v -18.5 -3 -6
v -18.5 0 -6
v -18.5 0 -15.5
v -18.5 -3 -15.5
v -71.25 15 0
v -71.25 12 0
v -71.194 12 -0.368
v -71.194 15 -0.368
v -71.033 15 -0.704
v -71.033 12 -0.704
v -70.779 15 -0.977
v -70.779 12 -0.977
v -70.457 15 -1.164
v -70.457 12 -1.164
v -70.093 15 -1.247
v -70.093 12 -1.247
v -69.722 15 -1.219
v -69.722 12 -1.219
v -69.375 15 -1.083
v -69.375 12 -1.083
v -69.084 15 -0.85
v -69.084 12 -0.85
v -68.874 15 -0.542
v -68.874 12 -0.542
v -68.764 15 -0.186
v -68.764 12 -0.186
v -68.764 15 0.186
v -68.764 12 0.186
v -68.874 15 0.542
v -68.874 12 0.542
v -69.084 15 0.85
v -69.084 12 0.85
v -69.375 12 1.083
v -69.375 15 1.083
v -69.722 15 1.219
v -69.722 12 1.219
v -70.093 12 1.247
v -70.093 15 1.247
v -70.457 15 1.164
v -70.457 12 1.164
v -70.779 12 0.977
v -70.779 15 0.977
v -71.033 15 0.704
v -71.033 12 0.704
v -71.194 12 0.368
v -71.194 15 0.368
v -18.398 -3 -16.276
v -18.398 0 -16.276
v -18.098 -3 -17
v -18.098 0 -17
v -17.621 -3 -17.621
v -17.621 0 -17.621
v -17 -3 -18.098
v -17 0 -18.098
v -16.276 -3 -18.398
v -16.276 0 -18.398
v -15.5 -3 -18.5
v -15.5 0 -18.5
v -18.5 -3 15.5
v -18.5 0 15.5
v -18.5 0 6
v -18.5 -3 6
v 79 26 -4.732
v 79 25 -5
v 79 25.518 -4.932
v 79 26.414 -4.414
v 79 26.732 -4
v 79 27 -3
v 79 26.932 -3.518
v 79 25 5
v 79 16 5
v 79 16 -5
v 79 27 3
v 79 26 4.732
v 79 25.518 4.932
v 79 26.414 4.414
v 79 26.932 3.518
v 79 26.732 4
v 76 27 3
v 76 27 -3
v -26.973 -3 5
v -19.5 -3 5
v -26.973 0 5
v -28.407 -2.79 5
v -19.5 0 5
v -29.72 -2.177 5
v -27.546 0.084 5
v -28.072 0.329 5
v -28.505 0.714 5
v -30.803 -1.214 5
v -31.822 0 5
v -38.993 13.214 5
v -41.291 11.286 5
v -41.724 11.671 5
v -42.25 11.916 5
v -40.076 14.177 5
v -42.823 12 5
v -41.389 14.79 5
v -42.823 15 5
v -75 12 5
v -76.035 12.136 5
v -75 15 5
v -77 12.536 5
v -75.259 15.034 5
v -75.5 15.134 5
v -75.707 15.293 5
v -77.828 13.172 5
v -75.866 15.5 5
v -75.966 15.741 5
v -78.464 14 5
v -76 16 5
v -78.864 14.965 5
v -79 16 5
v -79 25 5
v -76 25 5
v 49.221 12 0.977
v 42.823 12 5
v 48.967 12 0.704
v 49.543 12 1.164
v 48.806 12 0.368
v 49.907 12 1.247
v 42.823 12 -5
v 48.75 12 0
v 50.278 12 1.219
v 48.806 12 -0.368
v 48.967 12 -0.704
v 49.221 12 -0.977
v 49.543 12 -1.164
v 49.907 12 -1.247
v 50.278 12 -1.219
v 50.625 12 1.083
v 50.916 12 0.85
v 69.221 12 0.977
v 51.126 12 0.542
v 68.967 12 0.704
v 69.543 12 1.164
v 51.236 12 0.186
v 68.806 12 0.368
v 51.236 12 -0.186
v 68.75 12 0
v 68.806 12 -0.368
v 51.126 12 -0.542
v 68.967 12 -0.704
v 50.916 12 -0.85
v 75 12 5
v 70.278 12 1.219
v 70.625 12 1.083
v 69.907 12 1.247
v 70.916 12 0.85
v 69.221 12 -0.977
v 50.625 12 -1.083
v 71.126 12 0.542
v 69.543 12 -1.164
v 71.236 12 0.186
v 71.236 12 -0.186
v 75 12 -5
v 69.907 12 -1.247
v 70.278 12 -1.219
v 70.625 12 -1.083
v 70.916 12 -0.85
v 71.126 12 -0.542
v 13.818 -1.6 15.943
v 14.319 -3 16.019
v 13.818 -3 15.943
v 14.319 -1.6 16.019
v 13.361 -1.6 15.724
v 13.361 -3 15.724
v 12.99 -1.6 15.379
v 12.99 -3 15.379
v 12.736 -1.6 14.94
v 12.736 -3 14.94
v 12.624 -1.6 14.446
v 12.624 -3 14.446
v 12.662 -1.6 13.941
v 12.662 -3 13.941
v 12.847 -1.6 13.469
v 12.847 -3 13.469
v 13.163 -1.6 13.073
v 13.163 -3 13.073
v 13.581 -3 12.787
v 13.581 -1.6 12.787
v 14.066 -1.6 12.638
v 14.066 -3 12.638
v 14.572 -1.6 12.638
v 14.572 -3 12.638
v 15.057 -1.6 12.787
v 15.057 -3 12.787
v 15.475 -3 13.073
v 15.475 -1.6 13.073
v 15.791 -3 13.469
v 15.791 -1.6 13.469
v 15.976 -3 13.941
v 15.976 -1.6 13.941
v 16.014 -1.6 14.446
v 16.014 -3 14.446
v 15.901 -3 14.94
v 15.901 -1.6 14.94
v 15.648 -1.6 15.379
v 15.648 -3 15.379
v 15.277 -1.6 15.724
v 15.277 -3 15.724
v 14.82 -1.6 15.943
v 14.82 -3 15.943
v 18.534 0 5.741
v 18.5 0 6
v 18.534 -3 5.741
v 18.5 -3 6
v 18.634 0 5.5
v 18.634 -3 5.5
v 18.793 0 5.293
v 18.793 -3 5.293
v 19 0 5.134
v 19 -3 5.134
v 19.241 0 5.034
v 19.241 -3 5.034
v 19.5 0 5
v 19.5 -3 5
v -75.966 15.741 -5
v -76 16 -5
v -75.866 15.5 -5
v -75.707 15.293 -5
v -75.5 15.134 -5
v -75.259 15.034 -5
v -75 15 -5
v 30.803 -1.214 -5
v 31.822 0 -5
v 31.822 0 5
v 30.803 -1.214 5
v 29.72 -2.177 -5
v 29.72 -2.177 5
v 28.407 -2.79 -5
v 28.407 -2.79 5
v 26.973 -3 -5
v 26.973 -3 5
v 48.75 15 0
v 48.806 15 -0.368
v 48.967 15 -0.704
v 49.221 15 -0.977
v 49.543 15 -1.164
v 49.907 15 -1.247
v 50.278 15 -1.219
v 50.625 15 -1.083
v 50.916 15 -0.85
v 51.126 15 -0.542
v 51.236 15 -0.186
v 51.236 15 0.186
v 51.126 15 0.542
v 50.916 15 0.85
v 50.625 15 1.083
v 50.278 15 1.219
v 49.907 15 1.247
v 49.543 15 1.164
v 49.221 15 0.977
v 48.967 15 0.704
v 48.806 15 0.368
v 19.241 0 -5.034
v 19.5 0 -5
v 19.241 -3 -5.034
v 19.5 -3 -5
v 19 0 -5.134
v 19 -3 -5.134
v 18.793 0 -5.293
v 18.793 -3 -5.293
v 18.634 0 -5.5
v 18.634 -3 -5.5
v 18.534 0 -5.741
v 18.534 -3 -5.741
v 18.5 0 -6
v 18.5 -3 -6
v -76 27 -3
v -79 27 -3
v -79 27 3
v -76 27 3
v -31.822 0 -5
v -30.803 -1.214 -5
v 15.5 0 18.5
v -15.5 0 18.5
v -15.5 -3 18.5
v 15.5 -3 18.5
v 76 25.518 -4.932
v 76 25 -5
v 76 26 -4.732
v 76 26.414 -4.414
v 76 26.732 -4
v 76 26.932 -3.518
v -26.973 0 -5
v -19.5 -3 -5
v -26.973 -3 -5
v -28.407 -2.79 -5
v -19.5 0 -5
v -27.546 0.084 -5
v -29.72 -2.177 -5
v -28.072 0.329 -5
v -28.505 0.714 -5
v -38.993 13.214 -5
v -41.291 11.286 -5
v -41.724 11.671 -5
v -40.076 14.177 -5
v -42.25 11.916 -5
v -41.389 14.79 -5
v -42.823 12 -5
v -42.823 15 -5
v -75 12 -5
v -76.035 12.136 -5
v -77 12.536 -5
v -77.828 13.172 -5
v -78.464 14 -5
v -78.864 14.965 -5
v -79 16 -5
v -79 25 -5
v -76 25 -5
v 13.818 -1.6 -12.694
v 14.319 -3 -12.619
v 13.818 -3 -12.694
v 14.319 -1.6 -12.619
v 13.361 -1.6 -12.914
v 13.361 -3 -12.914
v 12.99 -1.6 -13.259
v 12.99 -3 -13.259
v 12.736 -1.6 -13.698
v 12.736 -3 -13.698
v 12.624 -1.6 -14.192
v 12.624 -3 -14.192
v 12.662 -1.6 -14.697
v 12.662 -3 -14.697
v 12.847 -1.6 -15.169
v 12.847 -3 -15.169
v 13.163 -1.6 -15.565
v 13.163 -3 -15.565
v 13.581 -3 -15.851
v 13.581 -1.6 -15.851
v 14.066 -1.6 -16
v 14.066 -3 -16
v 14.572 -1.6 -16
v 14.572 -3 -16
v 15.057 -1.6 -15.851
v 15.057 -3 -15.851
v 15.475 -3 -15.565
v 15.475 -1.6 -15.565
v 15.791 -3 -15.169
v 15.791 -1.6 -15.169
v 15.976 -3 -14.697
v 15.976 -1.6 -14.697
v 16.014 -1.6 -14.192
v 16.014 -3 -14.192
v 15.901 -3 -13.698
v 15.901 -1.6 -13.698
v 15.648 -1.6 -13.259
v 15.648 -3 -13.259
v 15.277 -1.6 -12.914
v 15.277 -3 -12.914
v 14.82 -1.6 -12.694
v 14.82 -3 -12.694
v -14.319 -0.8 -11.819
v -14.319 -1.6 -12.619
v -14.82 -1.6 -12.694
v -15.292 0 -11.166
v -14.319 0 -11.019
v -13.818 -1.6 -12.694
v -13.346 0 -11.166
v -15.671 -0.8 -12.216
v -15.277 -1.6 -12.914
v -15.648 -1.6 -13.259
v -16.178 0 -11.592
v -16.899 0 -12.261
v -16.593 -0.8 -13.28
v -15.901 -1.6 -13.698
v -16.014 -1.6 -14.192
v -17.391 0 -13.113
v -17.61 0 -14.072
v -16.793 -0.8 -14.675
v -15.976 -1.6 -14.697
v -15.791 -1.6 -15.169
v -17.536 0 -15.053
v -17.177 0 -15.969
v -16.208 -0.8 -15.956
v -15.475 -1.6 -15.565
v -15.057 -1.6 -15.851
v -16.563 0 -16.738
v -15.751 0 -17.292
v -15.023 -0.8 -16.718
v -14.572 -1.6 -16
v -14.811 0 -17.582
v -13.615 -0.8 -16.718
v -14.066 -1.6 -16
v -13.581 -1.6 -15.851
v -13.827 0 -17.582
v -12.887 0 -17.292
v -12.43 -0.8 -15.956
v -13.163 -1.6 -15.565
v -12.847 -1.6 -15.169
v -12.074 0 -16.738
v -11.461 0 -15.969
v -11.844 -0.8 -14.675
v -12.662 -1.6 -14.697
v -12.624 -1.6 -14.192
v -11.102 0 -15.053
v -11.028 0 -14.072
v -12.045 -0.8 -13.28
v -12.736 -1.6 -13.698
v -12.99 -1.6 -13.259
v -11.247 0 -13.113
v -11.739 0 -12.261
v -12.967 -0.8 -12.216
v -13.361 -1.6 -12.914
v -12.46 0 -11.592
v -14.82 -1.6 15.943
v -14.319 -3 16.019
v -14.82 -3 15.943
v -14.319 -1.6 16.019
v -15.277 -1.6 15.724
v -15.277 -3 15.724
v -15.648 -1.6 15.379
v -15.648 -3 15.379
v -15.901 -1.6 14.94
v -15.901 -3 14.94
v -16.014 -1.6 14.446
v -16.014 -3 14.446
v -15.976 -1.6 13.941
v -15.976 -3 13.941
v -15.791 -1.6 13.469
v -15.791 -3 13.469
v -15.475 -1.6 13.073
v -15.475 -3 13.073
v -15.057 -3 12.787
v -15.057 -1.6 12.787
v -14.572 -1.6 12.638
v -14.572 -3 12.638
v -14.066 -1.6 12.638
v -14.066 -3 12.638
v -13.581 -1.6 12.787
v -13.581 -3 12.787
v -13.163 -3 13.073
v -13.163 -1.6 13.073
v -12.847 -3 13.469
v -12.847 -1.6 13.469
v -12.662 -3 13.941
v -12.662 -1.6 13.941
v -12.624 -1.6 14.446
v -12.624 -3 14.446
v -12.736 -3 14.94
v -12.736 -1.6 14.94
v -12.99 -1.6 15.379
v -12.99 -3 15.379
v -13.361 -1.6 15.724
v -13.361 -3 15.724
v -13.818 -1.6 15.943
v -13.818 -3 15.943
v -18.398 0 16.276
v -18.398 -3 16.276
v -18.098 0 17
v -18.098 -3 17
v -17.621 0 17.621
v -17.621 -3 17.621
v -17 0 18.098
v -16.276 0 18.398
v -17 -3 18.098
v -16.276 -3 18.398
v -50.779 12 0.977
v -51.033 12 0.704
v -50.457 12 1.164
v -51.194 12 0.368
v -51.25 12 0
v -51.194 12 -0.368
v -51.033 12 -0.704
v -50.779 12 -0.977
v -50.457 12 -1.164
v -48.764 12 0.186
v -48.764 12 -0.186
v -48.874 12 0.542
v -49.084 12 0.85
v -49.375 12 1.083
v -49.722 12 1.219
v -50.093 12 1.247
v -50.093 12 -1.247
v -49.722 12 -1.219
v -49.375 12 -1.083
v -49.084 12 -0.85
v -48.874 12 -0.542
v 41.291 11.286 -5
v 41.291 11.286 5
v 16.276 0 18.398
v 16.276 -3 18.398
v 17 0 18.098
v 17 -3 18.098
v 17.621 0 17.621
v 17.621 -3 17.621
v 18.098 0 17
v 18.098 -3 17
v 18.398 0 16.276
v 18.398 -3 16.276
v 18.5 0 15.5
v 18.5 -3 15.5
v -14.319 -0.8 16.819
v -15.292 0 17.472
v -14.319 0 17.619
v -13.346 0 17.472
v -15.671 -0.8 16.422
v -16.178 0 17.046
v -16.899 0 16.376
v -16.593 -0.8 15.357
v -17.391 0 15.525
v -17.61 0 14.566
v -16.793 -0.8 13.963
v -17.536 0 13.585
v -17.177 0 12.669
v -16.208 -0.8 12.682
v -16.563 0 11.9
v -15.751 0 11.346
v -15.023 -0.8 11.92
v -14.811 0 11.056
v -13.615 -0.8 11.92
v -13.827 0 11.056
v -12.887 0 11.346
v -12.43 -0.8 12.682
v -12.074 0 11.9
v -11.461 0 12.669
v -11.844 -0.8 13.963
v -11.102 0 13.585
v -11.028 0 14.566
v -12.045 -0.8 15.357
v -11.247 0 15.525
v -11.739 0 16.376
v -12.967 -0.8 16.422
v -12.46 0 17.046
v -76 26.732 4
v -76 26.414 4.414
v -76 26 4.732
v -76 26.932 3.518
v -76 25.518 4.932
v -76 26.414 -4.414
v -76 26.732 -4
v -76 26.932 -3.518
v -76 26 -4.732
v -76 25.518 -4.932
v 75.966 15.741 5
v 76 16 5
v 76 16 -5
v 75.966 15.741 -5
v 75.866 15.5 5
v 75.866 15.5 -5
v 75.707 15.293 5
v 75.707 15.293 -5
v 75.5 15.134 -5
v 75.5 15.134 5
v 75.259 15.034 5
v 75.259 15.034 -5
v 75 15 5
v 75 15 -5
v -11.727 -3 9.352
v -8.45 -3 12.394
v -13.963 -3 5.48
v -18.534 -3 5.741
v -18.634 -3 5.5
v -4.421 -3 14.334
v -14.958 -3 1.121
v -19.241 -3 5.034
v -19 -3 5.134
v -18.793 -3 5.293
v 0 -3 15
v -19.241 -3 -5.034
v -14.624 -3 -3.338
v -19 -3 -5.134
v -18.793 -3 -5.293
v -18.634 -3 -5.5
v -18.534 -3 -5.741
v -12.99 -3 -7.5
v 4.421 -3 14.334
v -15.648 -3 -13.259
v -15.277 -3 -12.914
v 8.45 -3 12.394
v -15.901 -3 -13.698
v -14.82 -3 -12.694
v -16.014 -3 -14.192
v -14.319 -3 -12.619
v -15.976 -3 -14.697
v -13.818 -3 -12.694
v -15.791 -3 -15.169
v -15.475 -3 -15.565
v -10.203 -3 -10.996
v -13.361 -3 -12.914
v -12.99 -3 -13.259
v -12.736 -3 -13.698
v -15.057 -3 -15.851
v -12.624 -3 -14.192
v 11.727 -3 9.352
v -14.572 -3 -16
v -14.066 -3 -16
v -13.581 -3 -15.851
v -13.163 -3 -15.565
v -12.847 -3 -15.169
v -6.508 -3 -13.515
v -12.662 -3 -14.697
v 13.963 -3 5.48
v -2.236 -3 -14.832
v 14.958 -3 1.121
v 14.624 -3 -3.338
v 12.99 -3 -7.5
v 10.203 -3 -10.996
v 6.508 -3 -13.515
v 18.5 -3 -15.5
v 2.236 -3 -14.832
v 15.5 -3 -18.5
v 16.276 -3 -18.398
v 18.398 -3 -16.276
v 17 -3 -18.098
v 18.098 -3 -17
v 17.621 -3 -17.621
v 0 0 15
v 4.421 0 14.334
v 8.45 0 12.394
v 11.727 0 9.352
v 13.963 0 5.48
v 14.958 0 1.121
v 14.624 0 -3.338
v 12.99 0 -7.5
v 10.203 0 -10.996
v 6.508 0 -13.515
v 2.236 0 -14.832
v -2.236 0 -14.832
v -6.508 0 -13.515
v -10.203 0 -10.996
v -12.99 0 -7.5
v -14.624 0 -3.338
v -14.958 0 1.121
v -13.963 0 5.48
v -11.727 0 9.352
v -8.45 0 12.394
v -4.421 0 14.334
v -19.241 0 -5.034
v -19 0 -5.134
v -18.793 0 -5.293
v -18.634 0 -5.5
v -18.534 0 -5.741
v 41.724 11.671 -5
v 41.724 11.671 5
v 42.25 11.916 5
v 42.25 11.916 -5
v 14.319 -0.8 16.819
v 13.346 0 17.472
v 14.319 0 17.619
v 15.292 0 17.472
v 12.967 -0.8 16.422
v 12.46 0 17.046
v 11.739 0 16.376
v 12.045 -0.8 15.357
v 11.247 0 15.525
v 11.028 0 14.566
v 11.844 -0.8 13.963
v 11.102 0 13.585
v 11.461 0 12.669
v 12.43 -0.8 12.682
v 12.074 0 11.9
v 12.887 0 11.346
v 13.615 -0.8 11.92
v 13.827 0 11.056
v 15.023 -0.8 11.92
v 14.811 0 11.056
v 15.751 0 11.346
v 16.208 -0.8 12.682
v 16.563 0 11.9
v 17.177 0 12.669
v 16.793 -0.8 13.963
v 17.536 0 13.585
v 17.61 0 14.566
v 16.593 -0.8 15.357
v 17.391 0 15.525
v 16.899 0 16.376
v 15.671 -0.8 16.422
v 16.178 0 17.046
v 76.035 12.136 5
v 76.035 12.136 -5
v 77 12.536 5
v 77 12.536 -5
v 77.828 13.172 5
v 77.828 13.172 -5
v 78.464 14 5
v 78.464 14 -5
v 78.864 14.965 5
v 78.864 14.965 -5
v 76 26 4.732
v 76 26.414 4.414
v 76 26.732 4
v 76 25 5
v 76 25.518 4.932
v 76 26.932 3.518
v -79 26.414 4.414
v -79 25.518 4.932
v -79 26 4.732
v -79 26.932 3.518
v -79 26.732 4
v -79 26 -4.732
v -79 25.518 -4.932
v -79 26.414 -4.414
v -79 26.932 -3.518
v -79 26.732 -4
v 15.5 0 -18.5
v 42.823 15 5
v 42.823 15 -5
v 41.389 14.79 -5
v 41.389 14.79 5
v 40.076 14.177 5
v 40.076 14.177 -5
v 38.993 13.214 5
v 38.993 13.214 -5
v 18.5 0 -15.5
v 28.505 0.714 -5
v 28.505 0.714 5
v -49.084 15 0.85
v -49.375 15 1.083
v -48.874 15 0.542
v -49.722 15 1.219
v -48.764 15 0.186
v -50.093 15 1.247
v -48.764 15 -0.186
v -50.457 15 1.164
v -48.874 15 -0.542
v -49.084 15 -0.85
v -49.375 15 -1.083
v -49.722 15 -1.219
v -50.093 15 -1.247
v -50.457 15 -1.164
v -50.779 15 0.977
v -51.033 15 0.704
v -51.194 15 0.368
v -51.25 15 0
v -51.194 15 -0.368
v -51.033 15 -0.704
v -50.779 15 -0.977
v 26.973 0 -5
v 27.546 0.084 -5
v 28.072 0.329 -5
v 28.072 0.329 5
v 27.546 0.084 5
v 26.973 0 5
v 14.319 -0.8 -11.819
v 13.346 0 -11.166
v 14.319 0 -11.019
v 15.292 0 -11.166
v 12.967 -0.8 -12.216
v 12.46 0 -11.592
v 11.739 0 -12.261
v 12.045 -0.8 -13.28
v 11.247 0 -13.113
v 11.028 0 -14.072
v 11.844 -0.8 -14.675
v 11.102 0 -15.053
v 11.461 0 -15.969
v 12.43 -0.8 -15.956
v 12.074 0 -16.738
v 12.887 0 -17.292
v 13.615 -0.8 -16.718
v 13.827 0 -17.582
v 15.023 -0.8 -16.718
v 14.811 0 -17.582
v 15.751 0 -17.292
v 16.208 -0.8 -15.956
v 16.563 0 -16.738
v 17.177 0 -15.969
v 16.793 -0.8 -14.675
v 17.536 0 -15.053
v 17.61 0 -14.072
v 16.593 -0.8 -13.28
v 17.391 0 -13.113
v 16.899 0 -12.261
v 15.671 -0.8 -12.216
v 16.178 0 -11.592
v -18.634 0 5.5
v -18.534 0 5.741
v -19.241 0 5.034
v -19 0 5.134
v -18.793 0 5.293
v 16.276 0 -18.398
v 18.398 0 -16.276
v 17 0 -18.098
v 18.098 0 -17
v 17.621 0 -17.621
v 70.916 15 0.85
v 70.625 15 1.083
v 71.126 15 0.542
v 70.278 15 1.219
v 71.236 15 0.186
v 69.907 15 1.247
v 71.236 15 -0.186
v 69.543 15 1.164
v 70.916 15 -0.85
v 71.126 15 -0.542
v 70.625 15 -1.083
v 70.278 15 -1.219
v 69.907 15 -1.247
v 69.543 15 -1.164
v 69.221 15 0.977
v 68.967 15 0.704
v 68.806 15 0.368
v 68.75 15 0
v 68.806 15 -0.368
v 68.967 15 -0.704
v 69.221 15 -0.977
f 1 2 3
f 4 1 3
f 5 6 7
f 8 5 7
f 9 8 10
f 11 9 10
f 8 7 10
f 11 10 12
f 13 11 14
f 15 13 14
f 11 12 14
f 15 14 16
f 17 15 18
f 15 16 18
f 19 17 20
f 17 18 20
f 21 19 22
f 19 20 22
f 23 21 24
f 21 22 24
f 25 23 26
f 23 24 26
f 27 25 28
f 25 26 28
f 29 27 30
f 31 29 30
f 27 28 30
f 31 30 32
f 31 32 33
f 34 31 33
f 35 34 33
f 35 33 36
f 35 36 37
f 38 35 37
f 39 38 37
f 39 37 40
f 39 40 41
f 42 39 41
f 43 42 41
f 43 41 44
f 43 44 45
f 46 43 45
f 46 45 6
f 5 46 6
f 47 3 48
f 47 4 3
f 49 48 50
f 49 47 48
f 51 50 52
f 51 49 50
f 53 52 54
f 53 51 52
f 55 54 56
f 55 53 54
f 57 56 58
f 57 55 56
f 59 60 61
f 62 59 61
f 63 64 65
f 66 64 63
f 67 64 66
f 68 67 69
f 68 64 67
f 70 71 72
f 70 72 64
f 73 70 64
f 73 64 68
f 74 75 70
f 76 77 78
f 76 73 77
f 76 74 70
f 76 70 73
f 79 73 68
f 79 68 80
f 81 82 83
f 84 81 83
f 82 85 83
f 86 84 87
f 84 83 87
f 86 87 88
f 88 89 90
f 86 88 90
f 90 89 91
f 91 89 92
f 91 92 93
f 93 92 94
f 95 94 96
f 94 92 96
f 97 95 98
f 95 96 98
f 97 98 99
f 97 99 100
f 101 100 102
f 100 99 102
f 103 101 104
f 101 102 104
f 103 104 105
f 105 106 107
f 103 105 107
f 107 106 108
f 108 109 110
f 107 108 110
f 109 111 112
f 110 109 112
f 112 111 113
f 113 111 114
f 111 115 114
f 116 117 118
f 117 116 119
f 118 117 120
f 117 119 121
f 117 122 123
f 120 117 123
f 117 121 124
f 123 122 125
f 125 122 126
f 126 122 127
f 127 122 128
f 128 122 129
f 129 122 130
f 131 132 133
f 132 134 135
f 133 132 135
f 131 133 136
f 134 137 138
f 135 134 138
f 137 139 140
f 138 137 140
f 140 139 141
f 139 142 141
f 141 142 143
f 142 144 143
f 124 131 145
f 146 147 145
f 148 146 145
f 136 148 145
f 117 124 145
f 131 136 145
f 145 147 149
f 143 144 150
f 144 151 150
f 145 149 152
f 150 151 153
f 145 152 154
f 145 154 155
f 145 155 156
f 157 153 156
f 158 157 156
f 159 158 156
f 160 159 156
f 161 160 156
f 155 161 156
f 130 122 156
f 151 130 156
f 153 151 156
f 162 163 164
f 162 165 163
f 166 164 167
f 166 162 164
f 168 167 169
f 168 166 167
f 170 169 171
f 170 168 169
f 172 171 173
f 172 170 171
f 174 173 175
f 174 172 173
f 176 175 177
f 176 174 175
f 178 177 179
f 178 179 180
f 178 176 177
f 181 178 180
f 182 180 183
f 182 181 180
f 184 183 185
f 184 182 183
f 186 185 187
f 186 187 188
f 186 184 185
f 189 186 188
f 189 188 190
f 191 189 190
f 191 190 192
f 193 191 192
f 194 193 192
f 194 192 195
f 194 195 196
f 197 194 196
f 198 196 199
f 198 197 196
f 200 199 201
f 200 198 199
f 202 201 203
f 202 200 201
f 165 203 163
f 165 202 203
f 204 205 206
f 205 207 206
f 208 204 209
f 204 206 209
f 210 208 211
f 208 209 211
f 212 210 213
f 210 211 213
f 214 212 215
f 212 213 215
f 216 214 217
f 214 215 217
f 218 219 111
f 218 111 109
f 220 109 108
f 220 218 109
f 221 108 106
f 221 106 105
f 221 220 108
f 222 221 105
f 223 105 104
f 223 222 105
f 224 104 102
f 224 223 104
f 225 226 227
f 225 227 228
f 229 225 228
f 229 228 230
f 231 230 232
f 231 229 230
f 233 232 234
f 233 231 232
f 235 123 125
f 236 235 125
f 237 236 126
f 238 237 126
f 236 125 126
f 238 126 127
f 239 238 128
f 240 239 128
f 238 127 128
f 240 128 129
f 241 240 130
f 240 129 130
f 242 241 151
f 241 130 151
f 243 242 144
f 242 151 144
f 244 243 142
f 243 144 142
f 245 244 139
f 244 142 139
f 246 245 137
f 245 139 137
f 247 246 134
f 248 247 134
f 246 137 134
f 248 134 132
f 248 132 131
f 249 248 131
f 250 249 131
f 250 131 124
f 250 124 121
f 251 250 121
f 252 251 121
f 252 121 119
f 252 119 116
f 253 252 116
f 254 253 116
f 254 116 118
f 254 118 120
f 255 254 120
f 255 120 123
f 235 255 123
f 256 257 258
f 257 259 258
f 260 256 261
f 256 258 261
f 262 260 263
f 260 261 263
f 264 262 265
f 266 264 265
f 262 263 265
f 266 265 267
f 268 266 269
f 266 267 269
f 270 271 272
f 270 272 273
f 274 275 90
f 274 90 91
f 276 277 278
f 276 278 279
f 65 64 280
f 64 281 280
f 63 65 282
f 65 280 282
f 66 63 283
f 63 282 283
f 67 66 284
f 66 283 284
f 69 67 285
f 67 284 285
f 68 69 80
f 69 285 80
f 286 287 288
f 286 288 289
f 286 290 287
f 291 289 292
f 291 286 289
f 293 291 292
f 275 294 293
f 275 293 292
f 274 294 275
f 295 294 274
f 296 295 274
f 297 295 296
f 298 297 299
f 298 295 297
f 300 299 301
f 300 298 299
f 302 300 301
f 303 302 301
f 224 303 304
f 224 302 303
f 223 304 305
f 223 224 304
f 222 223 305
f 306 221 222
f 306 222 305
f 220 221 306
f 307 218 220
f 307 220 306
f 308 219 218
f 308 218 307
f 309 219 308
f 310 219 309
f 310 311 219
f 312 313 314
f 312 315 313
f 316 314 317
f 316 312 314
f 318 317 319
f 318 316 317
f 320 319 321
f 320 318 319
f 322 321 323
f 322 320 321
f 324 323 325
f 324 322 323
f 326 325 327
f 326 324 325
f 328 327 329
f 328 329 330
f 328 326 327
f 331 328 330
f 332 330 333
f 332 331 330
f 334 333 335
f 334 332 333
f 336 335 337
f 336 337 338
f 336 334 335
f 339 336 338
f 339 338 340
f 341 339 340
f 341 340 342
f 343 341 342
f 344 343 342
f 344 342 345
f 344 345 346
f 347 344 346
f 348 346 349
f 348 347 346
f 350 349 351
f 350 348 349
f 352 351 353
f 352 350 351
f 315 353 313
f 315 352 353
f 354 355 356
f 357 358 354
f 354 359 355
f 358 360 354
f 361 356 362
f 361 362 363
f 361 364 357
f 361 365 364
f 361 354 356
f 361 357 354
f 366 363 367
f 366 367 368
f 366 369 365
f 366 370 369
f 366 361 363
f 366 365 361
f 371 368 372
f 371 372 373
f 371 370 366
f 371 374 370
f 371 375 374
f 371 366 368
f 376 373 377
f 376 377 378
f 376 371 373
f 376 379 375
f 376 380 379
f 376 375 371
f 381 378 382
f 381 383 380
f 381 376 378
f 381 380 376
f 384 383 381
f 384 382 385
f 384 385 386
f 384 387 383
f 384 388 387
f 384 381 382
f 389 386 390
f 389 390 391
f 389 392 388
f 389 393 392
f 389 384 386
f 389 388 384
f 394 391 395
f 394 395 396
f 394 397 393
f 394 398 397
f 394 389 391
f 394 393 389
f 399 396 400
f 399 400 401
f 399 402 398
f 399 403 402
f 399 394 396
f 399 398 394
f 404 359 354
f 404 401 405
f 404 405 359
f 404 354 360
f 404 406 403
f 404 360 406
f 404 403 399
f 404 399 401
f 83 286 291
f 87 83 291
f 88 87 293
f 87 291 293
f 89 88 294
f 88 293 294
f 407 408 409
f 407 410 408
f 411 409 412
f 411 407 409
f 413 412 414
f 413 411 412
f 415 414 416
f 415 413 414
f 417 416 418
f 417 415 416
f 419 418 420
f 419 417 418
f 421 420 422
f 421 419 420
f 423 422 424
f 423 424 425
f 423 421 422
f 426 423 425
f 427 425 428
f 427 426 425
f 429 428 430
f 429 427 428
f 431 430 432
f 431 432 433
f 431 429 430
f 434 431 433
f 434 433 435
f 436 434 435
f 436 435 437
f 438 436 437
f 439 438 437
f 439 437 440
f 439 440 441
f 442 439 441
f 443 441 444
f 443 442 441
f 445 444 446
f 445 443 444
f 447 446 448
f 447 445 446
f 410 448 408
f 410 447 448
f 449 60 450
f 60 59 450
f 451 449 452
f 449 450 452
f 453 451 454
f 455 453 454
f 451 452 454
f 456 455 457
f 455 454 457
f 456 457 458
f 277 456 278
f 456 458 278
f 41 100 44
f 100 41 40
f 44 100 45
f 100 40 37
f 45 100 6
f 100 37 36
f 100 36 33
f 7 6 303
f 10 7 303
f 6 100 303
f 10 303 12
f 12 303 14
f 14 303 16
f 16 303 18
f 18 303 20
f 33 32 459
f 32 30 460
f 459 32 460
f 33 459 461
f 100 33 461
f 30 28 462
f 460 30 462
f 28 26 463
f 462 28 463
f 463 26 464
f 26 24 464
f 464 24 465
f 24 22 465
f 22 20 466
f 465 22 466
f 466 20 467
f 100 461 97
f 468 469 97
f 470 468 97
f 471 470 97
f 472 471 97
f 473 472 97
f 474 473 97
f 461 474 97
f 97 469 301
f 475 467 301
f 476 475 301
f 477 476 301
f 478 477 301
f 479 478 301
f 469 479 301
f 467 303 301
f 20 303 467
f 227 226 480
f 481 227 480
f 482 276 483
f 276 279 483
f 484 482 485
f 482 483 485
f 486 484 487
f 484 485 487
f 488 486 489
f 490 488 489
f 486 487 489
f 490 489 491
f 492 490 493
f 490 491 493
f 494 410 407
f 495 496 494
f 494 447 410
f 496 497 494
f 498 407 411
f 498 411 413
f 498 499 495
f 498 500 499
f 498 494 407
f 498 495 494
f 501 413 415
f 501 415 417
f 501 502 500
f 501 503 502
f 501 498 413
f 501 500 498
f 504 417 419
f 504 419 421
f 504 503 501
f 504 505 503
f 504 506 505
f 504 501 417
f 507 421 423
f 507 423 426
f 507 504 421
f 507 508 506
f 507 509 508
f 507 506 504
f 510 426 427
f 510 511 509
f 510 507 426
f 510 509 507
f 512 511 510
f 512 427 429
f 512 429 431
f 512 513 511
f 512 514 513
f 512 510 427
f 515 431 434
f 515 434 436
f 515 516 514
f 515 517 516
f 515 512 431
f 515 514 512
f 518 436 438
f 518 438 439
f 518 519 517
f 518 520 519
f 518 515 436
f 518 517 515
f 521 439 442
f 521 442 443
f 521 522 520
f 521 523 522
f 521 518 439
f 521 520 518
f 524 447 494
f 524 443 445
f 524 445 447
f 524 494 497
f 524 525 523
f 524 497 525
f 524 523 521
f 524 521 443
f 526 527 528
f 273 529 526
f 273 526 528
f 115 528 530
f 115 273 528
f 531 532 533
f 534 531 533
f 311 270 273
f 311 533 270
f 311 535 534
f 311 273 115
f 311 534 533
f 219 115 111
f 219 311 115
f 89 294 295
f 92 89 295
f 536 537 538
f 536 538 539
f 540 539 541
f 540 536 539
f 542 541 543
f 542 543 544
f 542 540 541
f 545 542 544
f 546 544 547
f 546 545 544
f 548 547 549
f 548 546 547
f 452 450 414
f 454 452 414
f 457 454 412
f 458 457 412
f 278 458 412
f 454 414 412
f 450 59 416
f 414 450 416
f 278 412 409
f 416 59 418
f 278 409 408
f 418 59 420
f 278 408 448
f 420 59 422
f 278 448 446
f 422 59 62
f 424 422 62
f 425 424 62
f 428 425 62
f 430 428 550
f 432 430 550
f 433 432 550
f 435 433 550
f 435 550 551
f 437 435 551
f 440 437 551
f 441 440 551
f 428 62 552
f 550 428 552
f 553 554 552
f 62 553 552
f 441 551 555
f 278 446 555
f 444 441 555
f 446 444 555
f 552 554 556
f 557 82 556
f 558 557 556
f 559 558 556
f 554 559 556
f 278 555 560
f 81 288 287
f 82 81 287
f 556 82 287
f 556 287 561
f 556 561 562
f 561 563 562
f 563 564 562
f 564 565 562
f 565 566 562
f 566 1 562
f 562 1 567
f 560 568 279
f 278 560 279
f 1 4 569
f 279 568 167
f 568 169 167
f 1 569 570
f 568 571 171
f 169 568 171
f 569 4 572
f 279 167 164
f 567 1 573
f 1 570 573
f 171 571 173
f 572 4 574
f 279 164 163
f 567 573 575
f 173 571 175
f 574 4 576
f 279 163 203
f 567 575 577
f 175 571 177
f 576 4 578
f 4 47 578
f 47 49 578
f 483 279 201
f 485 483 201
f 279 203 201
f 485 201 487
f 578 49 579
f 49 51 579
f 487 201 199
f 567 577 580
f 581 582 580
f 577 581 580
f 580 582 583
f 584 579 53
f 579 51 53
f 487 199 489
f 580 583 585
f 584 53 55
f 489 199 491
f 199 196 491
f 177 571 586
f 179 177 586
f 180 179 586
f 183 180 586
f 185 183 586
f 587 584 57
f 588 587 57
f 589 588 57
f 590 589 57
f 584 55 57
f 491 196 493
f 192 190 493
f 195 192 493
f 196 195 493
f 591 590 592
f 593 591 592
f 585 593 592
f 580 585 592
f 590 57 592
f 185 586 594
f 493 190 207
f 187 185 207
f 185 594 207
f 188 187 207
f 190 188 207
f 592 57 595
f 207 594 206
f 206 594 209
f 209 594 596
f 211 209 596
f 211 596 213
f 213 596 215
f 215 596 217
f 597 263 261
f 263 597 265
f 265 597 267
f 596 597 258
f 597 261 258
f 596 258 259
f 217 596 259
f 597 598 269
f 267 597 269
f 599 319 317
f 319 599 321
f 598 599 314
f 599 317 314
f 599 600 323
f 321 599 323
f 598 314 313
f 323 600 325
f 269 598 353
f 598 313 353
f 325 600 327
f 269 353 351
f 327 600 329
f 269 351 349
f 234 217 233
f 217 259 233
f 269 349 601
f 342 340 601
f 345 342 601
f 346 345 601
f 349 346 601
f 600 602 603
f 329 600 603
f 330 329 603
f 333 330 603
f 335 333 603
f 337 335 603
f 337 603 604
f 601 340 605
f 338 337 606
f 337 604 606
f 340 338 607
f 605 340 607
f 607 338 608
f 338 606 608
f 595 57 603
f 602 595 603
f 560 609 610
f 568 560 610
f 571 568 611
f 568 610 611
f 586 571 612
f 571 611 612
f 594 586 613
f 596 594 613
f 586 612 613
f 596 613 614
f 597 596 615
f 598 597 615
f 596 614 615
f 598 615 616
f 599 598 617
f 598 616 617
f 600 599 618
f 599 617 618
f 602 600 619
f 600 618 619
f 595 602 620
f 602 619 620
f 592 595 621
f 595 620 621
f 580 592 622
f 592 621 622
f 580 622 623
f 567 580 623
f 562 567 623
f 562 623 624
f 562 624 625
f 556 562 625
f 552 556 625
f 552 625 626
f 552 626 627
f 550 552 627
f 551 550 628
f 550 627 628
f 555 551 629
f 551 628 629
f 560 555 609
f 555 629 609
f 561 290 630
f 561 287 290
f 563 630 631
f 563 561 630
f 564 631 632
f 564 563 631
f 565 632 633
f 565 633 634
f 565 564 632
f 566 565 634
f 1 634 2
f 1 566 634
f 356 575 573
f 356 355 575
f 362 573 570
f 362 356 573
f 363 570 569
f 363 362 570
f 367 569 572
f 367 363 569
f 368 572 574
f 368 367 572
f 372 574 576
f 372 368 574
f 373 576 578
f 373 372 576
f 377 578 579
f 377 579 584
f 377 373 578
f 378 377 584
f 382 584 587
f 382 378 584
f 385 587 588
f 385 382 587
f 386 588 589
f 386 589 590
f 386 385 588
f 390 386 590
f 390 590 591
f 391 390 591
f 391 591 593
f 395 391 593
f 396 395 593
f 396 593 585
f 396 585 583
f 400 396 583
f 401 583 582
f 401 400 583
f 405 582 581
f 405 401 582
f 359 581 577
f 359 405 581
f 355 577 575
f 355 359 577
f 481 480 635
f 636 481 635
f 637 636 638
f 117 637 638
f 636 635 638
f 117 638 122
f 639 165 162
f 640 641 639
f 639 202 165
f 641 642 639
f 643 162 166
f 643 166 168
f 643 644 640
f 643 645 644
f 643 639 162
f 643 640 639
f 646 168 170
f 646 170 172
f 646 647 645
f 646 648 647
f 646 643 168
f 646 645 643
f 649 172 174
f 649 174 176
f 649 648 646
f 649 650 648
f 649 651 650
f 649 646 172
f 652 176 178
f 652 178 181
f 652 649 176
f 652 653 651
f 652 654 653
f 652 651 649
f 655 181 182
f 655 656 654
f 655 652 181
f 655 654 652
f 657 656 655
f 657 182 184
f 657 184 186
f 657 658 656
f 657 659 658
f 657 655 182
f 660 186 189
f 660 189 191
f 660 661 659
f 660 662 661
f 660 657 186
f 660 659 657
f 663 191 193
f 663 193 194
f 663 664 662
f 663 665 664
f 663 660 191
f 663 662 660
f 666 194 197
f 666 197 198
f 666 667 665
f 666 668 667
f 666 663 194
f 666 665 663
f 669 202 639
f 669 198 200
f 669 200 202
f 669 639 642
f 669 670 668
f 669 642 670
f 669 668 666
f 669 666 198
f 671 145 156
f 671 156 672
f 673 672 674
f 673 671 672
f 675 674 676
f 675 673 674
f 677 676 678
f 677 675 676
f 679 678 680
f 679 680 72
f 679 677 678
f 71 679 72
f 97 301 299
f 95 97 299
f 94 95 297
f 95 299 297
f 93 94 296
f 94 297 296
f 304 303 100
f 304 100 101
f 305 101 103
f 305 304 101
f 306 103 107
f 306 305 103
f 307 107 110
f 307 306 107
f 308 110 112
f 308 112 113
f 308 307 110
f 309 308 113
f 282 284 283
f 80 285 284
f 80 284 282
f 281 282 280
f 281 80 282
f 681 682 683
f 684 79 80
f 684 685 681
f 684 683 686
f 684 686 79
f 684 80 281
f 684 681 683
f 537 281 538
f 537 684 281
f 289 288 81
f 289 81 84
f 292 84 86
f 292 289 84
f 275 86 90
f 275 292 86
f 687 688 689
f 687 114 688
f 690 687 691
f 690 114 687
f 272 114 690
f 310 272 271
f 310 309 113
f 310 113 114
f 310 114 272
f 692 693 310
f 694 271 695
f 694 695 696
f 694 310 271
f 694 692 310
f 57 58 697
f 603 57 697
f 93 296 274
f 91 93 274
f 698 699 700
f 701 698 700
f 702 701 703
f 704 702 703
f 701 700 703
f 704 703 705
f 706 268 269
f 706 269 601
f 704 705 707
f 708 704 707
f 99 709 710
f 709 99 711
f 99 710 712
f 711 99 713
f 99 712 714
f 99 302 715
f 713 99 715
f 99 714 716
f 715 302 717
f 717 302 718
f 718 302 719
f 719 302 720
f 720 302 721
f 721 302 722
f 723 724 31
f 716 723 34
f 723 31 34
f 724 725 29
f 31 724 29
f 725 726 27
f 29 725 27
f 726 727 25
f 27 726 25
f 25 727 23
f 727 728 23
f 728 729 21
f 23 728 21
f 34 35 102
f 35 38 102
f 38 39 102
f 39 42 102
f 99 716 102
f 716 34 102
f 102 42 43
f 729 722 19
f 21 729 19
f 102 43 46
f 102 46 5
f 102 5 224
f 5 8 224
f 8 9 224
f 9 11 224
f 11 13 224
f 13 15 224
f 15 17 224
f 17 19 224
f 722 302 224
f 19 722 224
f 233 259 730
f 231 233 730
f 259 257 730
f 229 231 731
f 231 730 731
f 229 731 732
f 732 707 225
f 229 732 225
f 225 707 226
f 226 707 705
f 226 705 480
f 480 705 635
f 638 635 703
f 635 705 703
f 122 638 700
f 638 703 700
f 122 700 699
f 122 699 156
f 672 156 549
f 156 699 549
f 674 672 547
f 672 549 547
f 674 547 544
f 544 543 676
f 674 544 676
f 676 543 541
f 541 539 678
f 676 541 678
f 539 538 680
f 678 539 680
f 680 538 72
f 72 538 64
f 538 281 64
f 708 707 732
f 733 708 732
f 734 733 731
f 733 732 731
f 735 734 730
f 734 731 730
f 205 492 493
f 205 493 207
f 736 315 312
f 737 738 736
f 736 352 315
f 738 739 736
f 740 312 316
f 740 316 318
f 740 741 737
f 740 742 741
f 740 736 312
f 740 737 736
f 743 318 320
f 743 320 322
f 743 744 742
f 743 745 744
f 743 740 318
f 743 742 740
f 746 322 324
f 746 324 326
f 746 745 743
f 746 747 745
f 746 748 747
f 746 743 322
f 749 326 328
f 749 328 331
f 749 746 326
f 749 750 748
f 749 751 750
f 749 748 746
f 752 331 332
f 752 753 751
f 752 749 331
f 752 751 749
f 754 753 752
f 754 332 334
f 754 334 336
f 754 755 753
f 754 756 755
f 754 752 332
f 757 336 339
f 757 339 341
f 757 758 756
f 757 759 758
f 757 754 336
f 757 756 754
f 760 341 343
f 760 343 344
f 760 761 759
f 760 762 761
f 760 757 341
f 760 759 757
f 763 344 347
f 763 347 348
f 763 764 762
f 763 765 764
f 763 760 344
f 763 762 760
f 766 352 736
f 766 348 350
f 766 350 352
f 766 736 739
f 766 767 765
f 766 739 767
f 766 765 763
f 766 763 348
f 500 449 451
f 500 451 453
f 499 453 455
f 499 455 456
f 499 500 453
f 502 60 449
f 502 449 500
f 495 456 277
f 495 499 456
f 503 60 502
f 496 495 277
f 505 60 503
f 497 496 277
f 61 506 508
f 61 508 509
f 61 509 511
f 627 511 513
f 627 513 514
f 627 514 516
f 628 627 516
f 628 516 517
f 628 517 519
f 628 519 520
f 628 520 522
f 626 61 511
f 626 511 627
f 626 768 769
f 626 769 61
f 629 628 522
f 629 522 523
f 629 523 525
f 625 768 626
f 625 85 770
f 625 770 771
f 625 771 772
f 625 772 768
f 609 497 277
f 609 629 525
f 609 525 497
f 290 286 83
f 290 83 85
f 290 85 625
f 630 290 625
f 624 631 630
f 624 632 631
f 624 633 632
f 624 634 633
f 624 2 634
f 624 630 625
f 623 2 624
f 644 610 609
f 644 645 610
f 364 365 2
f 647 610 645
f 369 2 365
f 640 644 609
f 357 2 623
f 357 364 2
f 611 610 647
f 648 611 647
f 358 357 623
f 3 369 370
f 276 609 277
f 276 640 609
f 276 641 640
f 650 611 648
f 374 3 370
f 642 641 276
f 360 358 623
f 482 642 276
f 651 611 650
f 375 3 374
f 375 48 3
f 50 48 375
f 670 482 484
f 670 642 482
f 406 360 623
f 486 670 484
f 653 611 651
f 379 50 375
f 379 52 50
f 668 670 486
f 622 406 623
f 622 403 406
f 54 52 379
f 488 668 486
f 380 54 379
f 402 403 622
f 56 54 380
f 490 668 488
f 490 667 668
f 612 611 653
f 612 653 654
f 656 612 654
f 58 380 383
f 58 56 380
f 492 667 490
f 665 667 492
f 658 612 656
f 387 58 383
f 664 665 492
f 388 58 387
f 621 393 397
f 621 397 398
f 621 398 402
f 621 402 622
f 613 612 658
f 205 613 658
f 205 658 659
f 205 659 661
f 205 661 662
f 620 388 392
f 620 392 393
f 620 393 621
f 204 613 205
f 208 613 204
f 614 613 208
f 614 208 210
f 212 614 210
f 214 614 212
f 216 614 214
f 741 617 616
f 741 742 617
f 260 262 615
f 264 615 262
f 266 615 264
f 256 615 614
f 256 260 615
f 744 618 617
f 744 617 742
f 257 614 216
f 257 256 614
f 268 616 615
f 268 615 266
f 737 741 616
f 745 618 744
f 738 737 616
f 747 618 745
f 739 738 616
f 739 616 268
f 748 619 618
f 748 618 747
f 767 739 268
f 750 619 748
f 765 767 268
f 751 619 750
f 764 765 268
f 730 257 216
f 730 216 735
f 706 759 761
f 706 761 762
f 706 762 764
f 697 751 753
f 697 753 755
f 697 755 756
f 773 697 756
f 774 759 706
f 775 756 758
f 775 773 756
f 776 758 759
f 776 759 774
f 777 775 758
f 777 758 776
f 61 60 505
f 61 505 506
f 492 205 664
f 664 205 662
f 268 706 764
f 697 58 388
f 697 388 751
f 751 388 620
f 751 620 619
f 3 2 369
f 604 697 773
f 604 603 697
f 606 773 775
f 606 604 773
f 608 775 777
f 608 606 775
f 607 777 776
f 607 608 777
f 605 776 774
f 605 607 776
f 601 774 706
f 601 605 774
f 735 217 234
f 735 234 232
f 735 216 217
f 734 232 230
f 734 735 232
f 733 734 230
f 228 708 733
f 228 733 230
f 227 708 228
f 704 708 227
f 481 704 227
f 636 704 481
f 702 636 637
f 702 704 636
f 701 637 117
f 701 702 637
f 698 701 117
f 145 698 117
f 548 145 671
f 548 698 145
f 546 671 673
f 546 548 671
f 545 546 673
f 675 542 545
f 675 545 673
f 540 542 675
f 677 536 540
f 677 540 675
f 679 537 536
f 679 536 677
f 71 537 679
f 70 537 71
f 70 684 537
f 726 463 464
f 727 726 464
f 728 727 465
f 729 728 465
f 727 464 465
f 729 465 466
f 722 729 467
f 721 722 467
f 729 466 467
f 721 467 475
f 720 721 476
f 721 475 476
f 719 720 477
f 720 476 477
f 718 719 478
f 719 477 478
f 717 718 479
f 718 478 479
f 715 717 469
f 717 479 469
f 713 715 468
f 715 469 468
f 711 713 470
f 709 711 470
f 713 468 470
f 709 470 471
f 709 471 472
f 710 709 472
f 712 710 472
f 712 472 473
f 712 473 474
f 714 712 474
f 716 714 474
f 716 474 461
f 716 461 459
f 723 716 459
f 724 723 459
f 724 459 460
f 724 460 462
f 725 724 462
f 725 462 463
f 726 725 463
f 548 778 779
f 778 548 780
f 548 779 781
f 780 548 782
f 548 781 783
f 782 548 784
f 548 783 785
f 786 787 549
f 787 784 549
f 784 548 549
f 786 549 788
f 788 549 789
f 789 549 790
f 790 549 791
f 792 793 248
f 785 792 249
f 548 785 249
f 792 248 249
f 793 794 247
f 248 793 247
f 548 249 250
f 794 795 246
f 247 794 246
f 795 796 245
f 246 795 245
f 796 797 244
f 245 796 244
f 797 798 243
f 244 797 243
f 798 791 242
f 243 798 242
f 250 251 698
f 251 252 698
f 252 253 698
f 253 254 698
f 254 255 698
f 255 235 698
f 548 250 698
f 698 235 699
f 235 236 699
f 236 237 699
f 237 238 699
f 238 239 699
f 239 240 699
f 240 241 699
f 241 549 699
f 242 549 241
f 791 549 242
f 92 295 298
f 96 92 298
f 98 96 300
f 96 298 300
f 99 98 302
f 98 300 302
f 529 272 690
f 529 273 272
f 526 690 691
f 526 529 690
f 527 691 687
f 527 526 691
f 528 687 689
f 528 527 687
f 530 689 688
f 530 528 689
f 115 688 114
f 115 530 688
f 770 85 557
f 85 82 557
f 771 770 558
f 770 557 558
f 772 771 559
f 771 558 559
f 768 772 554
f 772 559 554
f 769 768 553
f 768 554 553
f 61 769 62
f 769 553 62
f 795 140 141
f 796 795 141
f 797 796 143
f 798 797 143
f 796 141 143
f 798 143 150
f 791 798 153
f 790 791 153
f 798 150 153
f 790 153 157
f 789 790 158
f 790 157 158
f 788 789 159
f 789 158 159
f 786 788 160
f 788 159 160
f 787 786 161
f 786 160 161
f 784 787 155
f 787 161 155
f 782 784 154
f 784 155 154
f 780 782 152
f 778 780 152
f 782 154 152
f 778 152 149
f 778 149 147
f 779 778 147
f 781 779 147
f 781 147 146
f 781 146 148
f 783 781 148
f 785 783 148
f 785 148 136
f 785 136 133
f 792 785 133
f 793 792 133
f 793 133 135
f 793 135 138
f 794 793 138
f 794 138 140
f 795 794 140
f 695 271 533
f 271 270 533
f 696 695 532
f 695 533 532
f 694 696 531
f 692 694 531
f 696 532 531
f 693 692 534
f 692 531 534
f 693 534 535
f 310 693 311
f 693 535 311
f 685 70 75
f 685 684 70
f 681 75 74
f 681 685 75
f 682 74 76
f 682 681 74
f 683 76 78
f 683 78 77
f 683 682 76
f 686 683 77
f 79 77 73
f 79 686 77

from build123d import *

# Parameters (mm, degrees)
SKETCH_1_W                  = 37
SKETCH_1_H                  = 37
SKETCH_1_R                  = 15
SKETCH_1_R_2                = 1.65
SM_BASE_FLANGE_1_DEPTH      = 3
FILLET_1_R                  = 3
SKETCH_6_W                  = 56.5
SKETCH_6_H                  = 10
EXTRUDE_1_DEPTH             = 3
OTHER_START                 = -5
OTHER_1_DEPTH               = 10
OTHER_1_2_DEPTH             = 10
OTHER_2_DEPTH               = 10
OTHER_2_2_DEPTH             = 10
SM_EDGE_FLANGE_1_DEPTH      = 10
SM_EDGE_FLANGE_2_DEPTH      = 10
SKETCH_18_R                 = 1
CUT_EXTRUDE_2_DEPTH         = 10
HOLE_WIZARD_M3_2_AT_2_COUNT = 2
HOLE_WIZARD_M3_2_AT_2_PITCH = 28.637824638
HOLE_WIZARD_M3_2_AT_3_COUNT = 2
HOLE_WIZARD_M3_2_AT_3_PITCH = 40.5
HOLE_WIZARD_M3_2_AT_4_COUNT = 2
HOLE_WIZARD_M3_2_AT_4_PITCH = 28.637824638
HOLE_WIZARD_M3_2_2_D        = 2.5
FILLET_2_R                  = 2
FILLET_3_R                  = 1


# Read off the part's stored shape, not the designer's step: 转折1, 转折2
# Sheet-metal steps are written as plain solids
with BuildPart() as part:
    # Sketch 1 → 基体-法兰1 (new body)
    with BuildSketch(Plane(origin=(0, 0, 0), x_dir=(1, 0, 0), z_dir=(0, 1, 0))):
        Rectangle(SKETCH_1_W, SKETCH_1_H)
        with Locations(Location((0, 0, 0), (0, 0, 270))):
            Circle(SKETCH_1_R, mode=Mode.SUBTRACT)
        with Locations(Location((-14.318912319, 14.318912319, 0), (0, 0, 270))):
            Circle(SKETCH_1_R_2, mode=Mode.SUBTRACT)
        with Locations(Location((14.318912319, 14.318912319, 0), (0, 0, 270))):
            Circle(SKETCH_1_R_2, mode=Mode.SUBTRACT)
        with Locations(Location((14.318912319, -14.318912319, 0), (0, 0, 270))):
            Circle(SKETCH_1_R_2, mode=Mode.SUBTRACT)
        with Locations(Location((-14.318912319, -14.318912319, 0), (0, 0, 270))):
            Circle(SKETCH_1_R_2, mode=Mode.SUBTRACT)
    extrude(amount=-SM_BASE_FLANGE_1_DEPTH)

    # 圆角1
    fillet_1_edges = [part.edges().sort_by_distance(p)[0] for p in [
        (18.5, -1.5, 18.5),
        (-18.5, -1.5, 18.5),
        (-18.5, -1.5, -18.5),
        (18.5, -1.5, -18.5),
    ]]
    fillet(fillet_1_edges, radius=FILLET_1_R)

    # 草图6 → 凸台-拉伸1 (add)
    with BuildSketch(Plane(origin=(0, 0, 0), x_dir=(1, 0, 0), z_dir=(0, 1, 0))):
        with Locations((-46.75, 0)):
            Rectangle(SKETCH_6_W, SKETCH_6_H)
        with Locations((46.75, 0)):
            Rectangle(SKETCH_6_W, SKETCH_6_H)
    extrude(amount=-EXTRUDE_1_DEPTH)

    # Other 1 outline → Other 1 (cut)
    with BuildSketch(Plane.XY.offset(OTHER_START)):
        with BuildLine():
            ThreePointArc((-26.972836905, -3), (-29.085928213, -2.531538935), (-30.80305912, -1.213938048))
            Line((-30.80305912, -1.213938048), (-31.821674088, 0))
            Line((-31.821674088, 0), (-75, 0))
            Line((-75, 0), (-75, -3))
            Line((-75, -3), (-26.972836905, -3))
        make_face()
    extrude(amount=OTHER_1_DEPTH, mode=Mode.SUBTRACT)

    # Other 1 2 outline → Other 1 2 (add)
    with BuildSketch(Plane.XY.offset(OTHER_START)):
        with BuildLine():
            Line((-41.291396093, 11.285575219), (-31.821674088, 0))
            Line((-31.821674088, 0), (-26.972836905, 0))
            ThreePointArc((-26.972836905, 0), (-27.818073428, 0.187384426), (-28.504925791, 0.714424781))
            Line((-28.504925791, 0.714424781), (-38.993262764, 13.213938048))
            ThreePointArc((-38.993262764, 13.213938048), (-40.710393671, 14.531538935), (-42.823484979, 15))
            Line((-42.823484979, 15), (-75, 15))
            Line((-75, 15), (-75, 12))
            Line((-75, 12), (-42.823484979, 12))
            ThreePointArc((-42.823484979, 12), (-41.978248456, 11.812615574), (-41.291396093, 11.285575219))
        make_face()
    extrude(amount=OTHER_1_2_DEPTH)

    # Other 2 outline → Other 2 (cut)
    with BuildSketch(Plane.XY.offset(OTHER_START)):
        with BuildLine():
            Line((75, 0), (31.821674088, 0))
            Line((31.821674088, 0), (30.80305912, -1.213938048))
            ThreePointArc((30.80305912, -1.213938048), (29.085928213, -2.531538935), (26.972836905, -3))
            Line((26.972836905, -3), (75, -3))
            Line((75, -3), (75, 0))
        make_face()
    extrude(amount=OTHER_2_DEPTH, mode=Mode.SUBTRACT)

    # Other 2 2 outline → Other 2 2 (add)
    with BuildSketch(Plane.XY.offset(OTHER_START)):
        with BuildLine():
            Line((42.823484979, 12), (75, 12))
            Line((75, 12), (75, 15))
            Line((75, 15), (42.823484979, 15))
            ThreePointArc((42.823484979, 15), (40.710393671, 14.531538935), (38.993262764, 13.213938048))
            Line((38.993262764, 13.213938048), (28.504925791, 0.714424781))
            ThreePointArc((28.504925791, 0.714424781), (27.818073428, 0.187384426), (26.972836905, 0))
            Line((26.972836905, 0), (31.821674088, 0))
            Line((31.821674088, 0), (41.291396093, 11.285575219))
            ThreePointArc((41.291396093, 11.285575219), (41.978248456, 11.812615574), (42.823484979, 12))
        make_face()
    extrude(amount=OTHER_2_2_DEPTH)

    # 边线-法兰1 section (across the edge) → 边线-法兰1 (add)
    with BuildSketch(Plane(origin=(76, 15, 5), x_dir=(-1, 0, 0), z_dir=(0, 0, -1))):
        with BuildLine():
            Line((-3, 1), (-3, 12))
            Line((-3, 12), (0, 12))
            Line((0, 12), (0, 1))
            ThreePointArc((0, 1), (0.292893219, 0.292893219), (1, 0))
            Line((1, 0), (1, -3))
            ThreePointArc((1, -3), (-1.828427125, -1.828427125), (-3, 1))
        make_face()
    extrude(amount=SM_EDGE_FLANGE_1_DEPTH)

    # 边线-法兰2 section (across the edge) → 边线-法兰2 (add)
    with BuildSketch(Plane(origin=(-76, 15, -5), x_dir=(1, 0, 0), z_dir=(0, 0, 1))):
        with BuildLine():
            Line((-3, 1), (-3, 12))
            Line((-3, 12), (0, 12))
            Line((0, 12), (0, 1))
            ThreePointArc((0, 1), (0.292893219, 0.292893219), (1, 0))
            Line((1, 0), (1, -3))
            ThreePointArc((1, -3), (-1.828427125, -1.828427125), (-3, 1))
        make_face()
    extrude(amount=SM_EDGE_FLANGE_2_DEPTH)

    # 草图18 → 切除-拉伸2 (cut)
    with BuildSketch(Plane.ZX.offset(15)):
        with Locations(Location((0, 50, 0), (0, 0, 270))):
            Circle(SKETCH_18_R)
        with Locations(Location((0, 70, 0), (0, 0, 270))):
            Circle(SKETCH_18_R)
        with Locations((0, -70)):
            Circle(SKETCH_18_R)
        with Locations((0, -50)):
            Circle(SKETCH_18_R)
    extrude(amount=-CUT_EXTRUDE_2_DEPTH, mode=Mode.SUBTRACT)

    # 草图24 → Hole Wizard M3 _2 (revolve, cut)
    with BuildSketch(Plane(origin=(-14.318912319, 0, -14.318912319), x_dir=(0, 0, 1), z_dir=(1, 0, 0))):
        Polygon((0, 0), (0, 3), (1.7, 3), (1.7, 1.6), (3.3, 0), align=None)
    hole_wizard_m3_2 = revolve(axis=Axis((-14.318912319, 6.35, -14.318912319), (0, -1, 0)), mode=Mode.SUBTRACT)

    # Hole Wizard M3 _2 at 2: Hole Wizard M3 _2 ×2
    with Locations(*[(i * HOLE_WIZARD_M3_2_AT_2_PITCH, 0, 0) for i in range(1, HOLE_WIZARD_M3_2_AT_2_COUNT)]):
        add(hole_wizard_m3_2, mode=Mode.SUBTRACT)

    # Hole Wizard M3 _2 at 3: Hole Wizard M3 _2 ×2
    with Locations(*[Vector(0.7071067811865451, 0, 0.70710678118655) * (i * HOLE_WIZARD_M3_2_AT_3_PITCH) for i in range(1, HOLE_WIZARD_M3_2_AT_3_COUNT)]):
        add(hole_wizard_m3_2, mode=Mode.SUBTRACT)

    # Hole Wizard M3 _2 at 4: Hole Wizard M3 _2 ×2
    with Locations(*[(0, 0, i * HOLE_WIZARD_M3_2_AT_4_PITCH) for i in range(1, HOLE_WIZARD_M3_2_AT_4_COUNT)]):
        add(hole_wizard_m3_2, mode=Mode.SUBTRACT)

    # Hole Wizard M3 _2 2 (through all)
    with Locations(Plane(origin=(0, 15, 0), x_dir=(1, 0, 0), z_dir=(0, 1, 0))):
        with Locations((-70, 0), (-50, 0), (50, 0), (70, 0)):
            Hole(HOLE_WIZARD_M3_2_2_D / 2)

    # 圆角2
    fillet_2_edges = [part.edges().sort_by_distance(p)[0] for p in [
        (77.5, 27, 5),
        (77.5, 27, -5),
        (-77.5, 27, -5),
        (-77.5, 27, 5),
    ]]
    fillet(fillet_2_edges, radius=FILLET_2_R)

    # 圆角3
    fillet_3_edges = [part.edges().sort_by_distance(p)[0] for p in [
        (18.5, -1.5, -5),
        (18.5, -1.5, 5),
        (-18.5, -1.5, -5),
        (-18.5, -1.5, 5),
    ]]
    fillet(fillet_3_edges, radius=FILLET_3_R)


solid = part.part
